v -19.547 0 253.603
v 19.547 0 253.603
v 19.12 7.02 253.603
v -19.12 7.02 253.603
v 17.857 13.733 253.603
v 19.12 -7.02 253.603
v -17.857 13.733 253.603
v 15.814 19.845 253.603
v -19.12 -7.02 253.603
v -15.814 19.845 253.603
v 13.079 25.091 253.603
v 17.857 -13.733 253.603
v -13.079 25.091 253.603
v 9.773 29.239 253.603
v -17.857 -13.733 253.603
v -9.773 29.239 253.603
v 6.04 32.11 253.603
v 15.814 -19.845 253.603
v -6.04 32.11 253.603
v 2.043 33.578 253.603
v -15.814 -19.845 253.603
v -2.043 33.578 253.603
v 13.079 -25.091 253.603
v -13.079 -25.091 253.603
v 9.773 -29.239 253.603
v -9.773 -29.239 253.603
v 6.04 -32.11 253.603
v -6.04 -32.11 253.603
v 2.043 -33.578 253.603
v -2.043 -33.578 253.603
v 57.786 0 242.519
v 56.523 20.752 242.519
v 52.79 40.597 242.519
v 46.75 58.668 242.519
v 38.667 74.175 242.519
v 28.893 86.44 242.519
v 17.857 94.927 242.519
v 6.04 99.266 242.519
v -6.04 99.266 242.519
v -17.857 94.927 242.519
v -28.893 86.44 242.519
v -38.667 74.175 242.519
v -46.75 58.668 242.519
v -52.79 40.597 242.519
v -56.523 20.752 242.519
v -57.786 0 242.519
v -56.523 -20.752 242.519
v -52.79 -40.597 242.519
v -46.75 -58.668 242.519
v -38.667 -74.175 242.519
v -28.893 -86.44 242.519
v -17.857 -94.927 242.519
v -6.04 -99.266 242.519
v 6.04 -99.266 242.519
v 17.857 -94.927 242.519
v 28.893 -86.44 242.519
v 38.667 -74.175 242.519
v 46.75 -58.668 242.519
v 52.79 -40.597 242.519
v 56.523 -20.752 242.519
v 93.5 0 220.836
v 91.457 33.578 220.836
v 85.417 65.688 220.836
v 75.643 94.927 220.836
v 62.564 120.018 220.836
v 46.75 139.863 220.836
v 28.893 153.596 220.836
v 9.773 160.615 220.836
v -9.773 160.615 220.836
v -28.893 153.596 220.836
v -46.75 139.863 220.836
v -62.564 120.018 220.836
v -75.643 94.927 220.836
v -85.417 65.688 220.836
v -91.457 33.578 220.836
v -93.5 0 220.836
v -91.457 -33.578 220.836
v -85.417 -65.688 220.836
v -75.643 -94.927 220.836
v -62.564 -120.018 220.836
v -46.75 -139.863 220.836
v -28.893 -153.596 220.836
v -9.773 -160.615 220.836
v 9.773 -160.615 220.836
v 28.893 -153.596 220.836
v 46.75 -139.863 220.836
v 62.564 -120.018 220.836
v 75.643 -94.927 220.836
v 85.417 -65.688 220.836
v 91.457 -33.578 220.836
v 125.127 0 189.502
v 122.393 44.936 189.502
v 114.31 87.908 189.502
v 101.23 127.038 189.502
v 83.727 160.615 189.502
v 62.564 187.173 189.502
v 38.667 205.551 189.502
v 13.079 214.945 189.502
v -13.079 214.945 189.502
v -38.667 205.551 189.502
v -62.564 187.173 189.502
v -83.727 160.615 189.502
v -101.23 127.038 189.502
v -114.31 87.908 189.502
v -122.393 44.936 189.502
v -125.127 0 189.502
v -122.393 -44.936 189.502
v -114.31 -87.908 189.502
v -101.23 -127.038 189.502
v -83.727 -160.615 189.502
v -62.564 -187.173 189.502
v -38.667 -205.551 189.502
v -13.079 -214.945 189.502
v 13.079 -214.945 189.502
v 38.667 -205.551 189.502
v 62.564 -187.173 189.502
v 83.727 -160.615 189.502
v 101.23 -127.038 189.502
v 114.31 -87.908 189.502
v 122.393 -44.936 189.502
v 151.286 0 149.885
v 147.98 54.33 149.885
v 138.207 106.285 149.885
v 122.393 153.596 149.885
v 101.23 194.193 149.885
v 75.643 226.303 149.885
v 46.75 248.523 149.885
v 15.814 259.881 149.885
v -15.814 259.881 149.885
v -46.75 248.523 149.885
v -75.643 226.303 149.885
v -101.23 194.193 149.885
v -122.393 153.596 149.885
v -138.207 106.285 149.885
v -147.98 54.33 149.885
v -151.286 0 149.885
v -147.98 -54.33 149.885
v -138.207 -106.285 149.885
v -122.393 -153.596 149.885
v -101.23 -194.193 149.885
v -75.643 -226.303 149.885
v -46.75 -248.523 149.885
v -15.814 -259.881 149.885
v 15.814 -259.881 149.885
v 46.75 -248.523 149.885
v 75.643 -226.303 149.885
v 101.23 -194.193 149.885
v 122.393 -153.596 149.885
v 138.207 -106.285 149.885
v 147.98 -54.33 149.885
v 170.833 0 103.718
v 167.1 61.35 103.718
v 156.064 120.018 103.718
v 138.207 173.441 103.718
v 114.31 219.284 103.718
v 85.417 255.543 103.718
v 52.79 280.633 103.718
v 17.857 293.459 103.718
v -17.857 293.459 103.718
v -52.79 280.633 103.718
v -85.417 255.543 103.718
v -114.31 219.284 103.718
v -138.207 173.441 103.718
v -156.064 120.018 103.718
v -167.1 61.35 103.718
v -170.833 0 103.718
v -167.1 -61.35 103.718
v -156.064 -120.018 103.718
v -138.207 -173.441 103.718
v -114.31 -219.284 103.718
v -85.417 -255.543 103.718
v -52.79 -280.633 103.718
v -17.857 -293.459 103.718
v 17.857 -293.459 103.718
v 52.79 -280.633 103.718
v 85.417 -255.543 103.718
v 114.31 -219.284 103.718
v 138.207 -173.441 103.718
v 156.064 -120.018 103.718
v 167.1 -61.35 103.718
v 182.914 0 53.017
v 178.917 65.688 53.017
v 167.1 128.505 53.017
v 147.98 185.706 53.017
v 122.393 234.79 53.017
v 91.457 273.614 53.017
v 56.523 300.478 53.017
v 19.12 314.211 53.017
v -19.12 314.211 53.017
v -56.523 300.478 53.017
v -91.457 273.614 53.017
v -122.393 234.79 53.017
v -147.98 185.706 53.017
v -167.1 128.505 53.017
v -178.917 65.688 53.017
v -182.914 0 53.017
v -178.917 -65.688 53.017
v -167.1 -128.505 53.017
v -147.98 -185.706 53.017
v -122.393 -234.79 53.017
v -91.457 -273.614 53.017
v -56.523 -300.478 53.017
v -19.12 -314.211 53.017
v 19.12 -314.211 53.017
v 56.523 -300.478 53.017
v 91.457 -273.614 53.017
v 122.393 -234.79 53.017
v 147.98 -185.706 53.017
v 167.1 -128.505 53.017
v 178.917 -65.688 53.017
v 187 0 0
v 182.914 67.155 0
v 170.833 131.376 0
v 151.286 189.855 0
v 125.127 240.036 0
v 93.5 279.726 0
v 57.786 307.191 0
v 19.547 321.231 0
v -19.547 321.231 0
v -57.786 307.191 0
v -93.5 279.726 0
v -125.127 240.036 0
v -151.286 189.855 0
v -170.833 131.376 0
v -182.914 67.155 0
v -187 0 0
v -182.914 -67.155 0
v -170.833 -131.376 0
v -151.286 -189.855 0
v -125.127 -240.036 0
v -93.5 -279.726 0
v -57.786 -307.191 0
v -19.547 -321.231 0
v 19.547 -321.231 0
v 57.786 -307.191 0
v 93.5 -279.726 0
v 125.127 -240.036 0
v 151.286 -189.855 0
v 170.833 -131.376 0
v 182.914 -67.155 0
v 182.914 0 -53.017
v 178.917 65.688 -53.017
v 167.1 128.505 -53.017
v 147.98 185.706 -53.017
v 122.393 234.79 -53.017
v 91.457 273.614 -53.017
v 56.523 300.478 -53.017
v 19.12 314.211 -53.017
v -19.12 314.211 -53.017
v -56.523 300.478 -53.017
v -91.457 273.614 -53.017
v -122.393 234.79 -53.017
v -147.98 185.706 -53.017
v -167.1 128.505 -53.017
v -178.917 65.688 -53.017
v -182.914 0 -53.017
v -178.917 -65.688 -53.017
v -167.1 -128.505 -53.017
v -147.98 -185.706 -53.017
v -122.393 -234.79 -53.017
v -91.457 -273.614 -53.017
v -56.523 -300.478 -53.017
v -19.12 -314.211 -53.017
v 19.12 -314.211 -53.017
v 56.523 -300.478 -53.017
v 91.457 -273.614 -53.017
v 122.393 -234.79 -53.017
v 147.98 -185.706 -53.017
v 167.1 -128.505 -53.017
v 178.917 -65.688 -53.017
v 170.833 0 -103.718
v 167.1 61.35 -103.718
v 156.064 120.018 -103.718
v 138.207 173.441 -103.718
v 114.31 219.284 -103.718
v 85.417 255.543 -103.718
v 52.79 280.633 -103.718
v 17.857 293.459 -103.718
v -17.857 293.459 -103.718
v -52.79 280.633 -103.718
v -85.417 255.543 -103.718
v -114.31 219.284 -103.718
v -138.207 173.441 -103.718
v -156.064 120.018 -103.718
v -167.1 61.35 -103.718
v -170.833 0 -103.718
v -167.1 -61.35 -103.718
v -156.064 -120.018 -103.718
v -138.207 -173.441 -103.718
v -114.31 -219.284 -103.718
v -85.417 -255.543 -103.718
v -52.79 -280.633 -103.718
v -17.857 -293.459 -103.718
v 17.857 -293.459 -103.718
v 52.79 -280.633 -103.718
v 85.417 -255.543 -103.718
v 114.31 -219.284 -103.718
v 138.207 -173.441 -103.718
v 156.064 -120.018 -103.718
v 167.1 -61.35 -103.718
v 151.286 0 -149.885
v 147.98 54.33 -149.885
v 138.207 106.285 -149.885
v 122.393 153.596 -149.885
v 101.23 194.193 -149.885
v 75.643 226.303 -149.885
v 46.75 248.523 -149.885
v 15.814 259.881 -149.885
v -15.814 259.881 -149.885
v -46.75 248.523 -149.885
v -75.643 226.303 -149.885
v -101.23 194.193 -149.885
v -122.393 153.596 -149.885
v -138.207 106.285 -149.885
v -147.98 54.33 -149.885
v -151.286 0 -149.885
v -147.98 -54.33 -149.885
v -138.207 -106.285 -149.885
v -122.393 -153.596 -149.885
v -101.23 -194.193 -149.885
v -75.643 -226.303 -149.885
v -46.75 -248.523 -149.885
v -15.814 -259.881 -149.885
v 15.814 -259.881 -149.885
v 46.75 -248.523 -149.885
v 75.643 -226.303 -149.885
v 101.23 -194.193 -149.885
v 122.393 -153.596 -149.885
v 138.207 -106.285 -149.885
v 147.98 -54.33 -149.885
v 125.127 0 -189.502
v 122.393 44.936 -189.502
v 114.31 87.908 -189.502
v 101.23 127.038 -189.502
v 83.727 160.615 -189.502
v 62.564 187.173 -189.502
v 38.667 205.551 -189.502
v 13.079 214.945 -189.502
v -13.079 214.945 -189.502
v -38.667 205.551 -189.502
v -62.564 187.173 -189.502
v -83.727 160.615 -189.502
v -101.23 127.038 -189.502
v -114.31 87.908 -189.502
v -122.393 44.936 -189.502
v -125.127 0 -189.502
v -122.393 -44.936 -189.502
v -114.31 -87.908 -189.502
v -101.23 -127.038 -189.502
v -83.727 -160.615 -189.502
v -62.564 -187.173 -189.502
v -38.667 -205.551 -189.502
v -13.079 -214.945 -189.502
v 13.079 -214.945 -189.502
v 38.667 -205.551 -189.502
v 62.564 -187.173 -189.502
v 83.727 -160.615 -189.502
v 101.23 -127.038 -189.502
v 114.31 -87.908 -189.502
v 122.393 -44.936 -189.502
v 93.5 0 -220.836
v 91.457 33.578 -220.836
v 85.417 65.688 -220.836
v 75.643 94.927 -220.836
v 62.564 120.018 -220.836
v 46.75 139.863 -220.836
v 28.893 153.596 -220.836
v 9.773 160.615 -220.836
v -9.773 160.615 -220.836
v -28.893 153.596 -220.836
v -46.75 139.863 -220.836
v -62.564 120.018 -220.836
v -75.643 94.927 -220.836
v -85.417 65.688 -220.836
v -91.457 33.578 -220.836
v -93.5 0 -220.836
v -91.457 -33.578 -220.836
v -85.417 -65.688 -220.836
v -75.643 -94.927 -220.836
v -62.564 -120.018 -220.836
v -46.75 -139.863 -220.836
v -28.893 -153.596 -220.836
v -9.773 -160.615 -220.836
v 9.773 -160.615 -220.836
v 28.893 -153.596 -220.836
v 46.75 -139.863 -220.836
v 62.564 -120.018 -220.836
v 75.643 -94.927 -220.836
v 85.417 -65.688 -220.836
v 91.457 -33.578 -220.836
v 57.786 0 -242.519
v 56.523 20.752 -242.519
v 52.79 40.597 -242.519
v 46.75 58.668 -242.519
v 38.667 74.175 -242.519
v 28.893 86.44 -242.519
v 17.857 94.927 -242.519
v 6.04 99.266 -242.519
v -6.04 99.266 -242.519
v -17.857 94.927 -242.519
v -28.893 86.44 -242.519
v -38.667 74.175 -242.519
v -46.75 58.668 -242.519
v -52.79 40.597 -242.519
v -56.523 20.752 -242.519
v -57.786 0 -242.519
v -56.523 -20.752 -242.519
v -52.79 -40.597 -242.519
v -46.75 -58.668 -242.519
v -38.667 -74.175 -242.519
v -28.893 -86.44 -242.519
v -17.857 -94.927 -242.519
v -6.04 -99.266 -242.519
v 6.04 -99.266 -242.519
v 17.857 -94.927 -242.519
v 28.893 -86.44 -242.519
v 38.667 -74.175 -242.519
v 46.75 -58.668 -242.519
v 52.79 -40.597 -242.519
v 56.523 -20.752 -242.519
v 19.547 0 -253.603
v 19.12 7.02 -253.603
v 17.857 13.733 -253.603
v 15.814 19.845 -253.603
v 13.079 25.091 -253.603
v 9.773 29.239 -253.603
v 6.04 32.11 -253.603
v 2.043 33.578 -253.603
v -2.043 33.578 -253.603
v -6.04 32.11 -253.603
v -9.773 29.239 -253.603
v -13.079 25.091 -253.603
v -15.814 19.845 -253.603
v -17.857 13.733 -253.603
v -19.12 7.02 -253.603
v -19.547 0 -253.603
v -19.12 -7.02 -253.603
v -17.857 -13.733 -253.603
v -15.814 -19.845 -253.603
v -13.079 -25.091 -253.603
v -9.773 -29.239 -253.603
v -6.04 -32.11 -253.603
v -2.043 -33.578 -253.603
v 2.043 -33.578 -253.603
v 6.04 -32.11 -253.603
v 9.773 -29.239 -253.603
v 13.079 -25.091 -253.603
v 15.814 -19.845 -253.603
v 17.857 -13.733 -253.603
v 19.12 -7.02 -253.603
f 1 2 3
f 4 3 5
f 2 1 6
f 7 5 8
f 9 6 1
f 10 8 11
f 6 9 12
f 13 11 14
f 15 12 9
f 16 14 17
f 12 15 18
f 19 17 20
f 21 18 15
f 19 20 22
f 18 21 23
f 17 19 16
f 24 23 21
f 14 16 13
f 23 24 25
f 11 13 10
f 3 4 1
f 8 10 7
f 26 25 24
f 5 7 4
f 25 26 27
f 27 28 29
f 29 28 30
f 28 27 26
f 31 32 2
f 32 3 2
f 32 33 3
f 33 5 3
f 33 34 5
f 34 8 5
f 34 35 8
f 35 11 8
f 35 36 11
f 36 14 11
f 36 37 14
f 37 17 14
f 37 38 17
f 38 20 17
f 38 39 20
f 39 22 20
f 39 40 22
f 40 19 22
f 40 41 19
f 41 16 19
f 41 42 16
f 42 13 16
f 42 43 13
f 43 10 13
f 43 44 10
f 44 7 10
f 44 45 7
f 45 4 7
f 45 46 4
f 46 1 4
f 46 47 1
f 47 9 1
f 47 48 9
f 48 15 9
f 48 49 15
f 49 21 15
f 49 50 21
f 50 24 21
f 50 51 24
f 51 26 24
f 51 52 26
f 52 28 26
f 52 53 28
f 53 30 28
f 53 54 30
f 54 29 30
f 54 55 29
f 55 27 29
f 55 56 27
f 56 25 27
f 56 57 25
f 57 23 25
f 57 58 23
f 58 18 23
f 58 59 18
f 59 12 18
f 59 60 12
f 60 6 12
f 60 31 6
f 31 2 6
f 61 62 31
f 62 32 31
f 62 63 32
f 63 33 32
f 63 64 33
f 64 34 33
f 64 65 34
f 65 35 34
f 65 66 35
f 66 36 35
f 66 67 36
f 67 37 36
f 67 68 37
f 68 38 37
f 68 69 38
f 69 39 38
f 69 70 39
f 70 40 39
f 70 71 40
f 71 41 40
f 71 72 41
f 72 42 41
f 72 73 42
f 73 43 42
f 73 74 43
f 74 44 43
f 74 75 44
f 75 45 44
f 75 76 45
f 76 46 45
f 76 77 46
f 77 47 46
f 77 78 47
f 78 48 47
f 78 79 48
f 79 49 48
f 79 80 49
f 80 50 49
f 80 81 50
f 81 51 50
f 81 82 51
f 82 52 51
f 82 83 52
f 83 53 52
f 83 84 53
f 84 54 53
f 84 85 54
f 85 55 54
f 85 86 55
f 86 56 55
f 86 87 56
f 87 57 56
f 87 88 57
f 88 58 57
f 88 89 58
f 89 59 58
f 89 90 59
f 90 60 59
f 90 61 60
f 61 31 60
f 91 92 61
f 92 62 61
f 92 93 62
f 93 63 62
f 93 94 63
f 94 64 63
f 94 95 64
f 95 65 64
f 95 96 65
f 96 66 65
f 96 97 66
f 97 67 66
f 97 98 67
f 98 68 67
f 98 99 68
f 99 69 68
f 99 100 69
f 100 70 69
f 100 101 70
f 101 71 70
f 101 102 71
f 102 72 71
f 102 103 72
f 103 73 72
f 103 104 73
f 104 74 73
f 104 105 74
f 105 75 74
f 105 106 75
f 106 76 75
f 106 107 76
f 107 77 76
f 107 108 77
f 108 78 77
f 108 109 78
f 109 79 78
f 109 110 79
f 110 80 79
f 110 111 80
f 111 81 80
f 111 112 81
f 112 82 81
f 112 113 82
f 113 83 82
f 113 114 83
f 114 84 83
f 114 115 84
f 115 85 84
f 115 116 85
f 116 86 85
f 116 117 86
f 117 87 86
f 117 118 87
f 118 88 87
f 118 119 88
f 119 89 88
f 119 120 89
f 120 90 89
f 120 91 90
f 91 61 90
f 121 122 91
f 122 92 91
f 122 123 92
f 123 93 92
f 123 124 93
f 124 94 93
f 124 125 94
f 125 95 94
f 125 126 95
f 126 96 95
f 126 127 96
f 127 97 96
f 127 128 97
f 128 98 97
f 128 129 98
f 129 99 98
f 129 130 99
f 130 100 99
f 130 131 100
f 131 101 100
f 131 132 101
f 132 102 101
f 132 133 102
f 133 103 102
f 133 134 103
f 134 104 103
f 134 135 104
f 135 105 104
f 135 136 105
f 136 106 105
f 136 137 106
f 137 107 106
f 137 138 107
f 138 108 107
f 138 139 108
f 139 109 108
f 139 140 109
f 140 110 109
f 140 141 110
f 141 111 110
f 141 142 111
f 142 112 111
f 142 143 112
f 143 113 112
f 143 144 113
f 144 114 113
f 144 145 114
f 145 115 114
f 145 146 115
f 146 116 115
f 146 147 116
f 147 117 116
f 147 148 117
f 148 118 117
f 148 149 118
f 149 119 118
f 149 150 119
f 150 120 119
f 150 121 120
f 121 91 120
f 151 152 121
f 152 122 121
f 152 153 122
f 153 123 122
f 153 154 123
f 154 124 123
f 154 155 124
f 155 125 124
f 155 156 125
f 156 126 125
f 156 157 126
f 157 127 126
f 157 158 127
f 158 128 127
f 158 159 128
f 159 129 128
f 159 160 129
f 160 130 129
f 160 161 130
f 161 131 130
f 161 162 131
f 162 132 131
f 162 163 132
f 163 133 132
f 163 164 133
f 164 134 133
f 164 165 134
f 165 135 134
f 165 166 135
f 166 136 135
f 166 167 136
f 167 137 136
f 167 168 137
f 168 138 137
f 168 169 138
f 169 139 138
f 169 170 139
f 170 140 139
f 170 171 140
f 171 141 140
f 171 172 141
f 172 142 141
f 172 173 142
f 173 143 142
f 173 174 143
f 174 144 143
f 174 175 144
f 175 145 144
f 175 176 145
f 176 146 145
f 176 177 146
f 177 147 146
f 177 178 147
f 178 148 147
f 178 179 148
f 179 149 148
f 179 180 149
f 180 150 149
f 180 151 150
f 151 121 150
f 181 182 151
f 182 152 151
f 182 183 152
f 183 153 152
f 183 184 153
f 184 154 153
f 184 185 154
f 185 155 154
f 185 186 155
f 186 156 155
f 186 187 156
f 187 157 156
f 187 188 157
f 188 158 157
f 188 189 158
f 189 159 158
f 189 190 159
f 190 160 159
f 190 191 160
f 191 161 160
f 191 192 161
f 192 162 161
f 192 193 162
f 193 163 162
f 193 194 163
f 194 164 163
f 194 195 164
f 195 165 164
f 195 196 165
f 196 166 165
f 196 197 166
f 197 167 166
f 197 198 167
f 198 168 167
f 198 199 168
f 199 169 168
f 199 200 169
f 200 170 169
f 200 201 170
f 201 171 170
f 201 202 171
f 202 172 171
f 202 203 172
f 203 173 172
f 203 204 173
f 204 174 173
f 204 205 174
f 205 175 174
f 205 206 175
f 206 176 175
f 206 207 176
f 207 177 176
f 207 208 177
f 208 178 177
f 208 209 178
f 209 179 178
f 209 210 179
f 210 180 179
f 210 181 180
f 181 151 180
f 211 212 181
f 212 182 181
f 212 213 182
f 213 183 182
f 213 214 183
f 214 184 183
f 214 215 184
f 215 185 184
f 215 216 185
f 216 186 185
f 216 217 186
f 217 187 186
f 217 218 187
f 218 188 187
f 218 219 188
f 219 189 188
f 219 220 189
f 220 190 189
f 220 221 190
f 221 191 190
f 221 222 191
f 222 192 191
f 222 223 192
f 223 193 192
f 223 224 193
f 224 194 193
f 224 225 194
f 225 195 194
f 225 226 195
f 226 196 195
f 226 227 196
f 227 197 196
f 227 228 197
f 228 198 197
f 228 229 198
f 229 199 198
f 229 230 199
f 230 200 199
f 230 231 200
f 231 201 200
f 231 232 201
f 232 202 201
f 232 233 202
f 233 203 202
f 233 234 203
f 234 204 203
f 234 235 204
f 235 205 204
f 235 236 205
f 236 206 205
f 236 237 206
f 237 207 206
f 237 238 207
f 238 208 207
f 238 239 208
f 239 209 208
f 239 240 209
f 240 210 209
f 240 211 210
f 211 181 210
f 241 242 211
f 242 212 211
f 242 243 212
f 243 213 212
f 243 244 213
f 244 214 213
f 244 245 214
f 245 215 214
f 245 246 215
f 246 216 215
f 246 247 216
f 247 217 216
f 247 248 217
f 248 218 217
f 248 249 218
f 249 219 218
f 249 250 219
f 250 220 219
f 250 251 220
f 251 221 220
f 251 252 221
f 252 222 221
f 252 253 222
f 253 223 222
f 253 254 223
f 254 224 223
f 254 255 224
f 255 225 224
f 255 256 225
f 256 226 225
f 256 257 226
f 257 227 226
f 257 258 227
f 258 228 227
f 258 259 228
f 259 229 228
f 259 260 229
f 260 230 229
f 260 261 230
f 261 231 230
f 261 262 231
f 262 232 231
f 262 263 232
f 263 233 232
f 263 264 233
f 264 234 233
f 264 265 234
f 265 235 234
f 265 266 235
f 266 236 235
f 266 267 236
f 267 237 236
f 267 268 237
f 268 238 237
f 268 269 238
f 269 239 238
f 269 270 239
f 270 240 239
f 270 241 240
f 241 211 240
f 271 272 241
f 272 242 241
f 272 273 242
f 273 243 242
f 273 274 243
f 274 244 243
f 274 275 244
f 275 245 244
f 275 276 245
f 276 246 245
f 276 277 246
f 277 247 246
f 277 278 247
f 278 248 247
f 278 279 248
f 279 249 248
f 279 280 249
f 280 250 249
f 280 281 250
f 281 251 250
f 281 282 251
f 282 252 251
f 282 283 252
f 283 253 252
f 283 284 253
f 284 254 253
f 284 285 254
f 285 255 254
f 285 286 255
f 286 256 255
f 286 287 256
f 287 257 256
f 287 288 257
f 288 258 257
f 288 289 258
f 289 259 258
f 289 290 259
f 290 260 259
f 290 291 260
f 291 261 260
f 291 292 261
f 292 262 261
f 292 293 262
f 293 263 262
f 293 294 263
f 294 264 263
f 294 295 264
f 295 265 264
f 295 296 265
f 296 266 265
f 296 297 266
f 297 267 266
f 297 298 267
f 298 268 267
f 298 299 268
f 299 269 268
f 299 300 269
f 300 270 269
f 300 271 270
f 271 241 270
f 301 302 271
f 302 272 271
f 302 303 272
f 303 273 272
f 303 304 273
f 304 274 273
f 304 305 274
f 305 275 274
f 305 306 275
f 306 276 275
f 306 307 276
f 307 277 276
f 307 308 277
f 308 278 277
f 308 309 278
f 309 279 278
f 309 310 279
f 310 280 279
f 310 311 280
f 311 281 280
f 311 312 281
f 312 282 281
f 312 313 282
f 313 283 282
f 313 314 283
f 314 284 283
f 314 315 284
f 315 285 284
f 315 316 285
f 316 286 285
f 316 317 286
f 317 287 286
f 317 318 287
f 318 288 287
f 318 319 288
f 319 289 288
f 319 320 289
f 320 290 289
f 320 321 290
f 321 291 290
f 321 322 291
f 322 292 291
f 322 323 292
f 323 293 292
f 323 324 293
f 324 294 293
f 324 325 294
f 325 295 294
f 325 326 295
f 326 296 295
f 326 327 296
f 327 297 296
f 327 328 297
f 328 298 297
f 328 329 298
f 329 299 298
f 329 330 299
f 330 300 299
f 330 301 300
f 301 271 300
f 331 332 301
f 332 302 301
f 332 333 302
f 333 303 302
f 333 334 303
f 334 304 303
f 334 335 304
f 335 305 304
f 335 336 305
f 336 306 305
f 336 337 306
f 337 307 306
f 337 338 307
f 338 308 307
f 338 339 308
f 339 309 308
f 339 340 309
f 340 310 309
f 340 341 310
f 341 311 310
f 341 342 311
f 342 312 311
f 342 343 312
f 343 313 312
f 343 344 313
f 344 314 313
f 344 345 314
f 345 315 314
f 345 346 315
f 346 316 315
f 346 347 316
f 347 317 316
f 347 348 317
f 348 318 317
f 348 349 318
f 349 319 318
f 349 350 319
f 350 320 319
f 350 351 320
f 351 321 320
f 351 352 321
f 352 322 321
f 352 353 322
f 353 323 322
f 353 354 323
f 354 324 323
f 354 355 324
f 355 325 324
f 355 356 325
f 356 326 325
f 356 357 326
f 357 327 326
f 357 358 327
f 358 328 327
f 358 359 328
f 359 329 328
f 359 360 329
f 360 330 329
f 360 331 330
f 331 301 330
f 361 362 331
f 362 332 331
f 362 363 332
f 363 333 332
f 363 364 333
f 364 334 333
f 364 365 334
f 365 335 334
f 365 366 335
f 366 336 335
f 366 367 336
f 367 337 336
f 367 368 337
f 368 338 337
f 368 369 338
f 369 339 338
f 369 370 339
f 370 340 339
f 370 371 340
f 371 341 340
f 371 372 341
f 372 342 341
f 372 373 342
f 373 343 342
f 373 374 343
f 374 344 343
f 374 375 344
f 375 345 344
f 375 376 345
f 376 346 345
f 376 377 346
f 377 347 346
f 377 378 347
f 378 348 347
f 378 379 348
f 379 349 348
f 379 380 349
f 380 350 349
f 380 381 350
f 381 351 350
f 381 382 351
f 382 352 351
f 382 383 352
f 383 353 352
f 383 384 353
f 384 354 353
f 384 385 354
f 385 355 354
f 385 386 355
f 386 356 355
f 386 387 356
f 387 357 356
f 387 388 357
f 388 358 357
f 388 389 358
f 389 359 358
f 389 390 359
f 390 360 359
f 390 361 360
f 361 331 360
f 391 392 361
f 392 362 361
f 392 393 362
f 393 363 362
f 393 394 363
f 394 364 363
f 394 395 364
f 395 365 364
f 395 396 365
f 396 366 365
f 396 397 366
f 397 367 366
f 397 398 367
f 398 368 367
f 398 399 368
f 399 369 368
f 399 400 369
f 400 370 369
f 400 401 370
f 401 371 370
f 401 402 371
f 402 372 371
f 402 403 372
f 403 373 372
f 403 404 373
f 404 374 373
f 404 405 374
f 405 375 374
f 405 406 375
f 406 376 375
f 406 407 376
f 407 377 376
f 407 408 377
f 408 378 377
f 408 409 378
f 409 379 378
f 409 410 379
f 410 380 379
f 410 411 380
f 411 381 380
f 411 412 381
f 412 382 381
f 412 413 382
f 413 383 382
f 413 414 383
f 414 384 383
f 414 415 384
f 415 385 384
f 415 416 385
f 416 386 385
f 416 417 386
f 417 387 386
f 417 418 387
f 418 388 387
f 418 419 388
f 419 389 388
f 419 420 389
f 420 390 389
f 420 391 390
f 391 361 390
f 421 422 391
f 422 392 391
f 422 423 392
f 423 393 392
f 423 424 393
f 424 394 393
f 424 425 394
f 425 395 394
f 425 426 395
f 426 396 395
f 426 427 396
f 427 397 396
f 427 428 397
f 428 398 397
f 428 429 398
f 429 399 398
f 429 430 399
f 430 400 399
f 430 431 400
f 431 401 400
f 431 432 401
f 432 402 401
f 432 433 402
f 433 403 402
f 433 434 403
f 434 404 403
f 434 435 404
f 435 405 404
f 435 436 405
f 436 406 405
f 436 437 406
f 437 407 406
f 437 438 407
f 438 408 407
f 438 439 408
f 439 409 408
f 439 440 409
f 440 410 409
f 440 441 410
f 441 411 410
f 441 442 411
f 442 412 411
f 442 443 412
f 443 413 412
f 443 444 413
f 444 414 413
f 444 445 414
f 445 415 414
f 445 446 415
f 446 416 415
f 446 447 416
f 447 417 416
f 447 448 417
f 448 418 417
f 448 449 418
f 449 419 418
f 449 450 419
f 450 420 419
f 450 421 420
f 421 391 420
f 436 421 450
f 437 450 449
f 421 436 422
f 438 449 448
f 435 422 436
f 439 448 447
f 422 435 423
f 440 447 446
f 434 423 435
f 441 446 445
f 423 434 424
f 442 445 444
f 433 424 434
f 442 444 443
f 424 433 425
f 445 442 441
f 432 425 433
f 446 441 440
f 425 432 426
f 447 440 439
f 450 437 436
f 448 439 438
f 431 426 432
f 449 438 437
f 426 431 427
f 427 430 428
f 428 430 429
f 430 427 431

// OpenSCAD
// Generated by SolidPython 1.0.1 on 2020-07-29 00:46:50


scale(v = [11, 19, 15]) {
	sphere(r = 17);
}
/***********************************************
*********      SolidPython code:      **********
************************************************
 
# import packages: SolidPython
from solid import *
from solid.utils import *
from itertools import chain, combinations, permutations


class Resize:

    def __init__(self, scad_file):
        self.scad_file = scad_file
        #self.scad_file = import_scad(scad_file)
        # cone/cylinder param:
        self.r1 = 0
        self.r2 = 0
        self.h = 0
        # rectangular prism param:
        self.w = 0
        self.l = 0
        # ellipse param:
        self.r = 0

    # import OpenScad code (file name corresponds to shape)


    # classify shape + parameters
    def assign(self, param1, param2, param3):
        if self.scad_file == 'cone.scad':
            self.r1 = param1
            self.r2 = param2
            self.h = param3
        elif self.scad_file == 'cylinder.scad':
            self.r1 = param1
            self.r2 = param2
            self.h = param3
        elif self.scad_file == 'rectangularPrism.scad':
            self.h = param1
            self.l = param2
            self.w = param3
        else:
            self.r = param1
            self.h = param2

    # resize parameters
    def iterate(self):
        x = range(3, 20, 2)
        i = 1
        if self.scad_file == 'cone.scad':
            tempList = list(permutations(x, 2))
            for temp in tempList:
                param1 = temp[0]
                param2 = temp[1]
                filepath = 'produced_scad_files/' + 'cone' + str(param1) + '_' + str(param2) + '_' + '.scad'
                scad_render_to_file(cylinder(h=param1, r1=param2, r2=0), filepath)

        elif self.scad_file == 'cylinder.scad':
            tempList = list(permutations(x, 3))
            for temp in tempList:
                param1 = temp[0]
                param2 = temp[1]
                filepath = 'produced_scad_files/' + 'cylinder' + str(param1) + '_' + str(param2) + '_' + '.scad'
                scad_render_to_file(cylinder(h=param1, r1=param2, r2=param2), filepath)

        elif self.scad_file == 'rectangularPrism.scad':
            tempList = list(permutations(x, 3))
            for temp in tempList:
                param1 = temp[0]
                param2 = temp[1]
                param3 = temp[2]
                filepath = 'produced_scad_files/' + 'rectangularPrism' + str(param1) + '_' + str(param2) + '_' + str(
                    param3) + '.scad'
                scad_render_to_file(cube(size=(param1, param2, param3)), filepath)

        elif self.scad_file == 'ellipse.scad':
            tempList = list(permutations(x, 4))
            for temp in tempList:
                param1 = temp[0]
                param2 = temp[1]
                param3 = temp[2]
                param4 = temp[3]
                filepath = 'produced_scad_files/' + 'ellipse' + str(param1) + '_' + str(param2) + '_' + str(param3) + '_' + str(param4) + '.scad'
                scad_render_to_file(scale([param1, param2, param3])(sphere(r=param4)), filepath)

    def render_to_scadfile(self):
        scad_render_to_file(scad, 'example.scad') 
 
************************************************/
